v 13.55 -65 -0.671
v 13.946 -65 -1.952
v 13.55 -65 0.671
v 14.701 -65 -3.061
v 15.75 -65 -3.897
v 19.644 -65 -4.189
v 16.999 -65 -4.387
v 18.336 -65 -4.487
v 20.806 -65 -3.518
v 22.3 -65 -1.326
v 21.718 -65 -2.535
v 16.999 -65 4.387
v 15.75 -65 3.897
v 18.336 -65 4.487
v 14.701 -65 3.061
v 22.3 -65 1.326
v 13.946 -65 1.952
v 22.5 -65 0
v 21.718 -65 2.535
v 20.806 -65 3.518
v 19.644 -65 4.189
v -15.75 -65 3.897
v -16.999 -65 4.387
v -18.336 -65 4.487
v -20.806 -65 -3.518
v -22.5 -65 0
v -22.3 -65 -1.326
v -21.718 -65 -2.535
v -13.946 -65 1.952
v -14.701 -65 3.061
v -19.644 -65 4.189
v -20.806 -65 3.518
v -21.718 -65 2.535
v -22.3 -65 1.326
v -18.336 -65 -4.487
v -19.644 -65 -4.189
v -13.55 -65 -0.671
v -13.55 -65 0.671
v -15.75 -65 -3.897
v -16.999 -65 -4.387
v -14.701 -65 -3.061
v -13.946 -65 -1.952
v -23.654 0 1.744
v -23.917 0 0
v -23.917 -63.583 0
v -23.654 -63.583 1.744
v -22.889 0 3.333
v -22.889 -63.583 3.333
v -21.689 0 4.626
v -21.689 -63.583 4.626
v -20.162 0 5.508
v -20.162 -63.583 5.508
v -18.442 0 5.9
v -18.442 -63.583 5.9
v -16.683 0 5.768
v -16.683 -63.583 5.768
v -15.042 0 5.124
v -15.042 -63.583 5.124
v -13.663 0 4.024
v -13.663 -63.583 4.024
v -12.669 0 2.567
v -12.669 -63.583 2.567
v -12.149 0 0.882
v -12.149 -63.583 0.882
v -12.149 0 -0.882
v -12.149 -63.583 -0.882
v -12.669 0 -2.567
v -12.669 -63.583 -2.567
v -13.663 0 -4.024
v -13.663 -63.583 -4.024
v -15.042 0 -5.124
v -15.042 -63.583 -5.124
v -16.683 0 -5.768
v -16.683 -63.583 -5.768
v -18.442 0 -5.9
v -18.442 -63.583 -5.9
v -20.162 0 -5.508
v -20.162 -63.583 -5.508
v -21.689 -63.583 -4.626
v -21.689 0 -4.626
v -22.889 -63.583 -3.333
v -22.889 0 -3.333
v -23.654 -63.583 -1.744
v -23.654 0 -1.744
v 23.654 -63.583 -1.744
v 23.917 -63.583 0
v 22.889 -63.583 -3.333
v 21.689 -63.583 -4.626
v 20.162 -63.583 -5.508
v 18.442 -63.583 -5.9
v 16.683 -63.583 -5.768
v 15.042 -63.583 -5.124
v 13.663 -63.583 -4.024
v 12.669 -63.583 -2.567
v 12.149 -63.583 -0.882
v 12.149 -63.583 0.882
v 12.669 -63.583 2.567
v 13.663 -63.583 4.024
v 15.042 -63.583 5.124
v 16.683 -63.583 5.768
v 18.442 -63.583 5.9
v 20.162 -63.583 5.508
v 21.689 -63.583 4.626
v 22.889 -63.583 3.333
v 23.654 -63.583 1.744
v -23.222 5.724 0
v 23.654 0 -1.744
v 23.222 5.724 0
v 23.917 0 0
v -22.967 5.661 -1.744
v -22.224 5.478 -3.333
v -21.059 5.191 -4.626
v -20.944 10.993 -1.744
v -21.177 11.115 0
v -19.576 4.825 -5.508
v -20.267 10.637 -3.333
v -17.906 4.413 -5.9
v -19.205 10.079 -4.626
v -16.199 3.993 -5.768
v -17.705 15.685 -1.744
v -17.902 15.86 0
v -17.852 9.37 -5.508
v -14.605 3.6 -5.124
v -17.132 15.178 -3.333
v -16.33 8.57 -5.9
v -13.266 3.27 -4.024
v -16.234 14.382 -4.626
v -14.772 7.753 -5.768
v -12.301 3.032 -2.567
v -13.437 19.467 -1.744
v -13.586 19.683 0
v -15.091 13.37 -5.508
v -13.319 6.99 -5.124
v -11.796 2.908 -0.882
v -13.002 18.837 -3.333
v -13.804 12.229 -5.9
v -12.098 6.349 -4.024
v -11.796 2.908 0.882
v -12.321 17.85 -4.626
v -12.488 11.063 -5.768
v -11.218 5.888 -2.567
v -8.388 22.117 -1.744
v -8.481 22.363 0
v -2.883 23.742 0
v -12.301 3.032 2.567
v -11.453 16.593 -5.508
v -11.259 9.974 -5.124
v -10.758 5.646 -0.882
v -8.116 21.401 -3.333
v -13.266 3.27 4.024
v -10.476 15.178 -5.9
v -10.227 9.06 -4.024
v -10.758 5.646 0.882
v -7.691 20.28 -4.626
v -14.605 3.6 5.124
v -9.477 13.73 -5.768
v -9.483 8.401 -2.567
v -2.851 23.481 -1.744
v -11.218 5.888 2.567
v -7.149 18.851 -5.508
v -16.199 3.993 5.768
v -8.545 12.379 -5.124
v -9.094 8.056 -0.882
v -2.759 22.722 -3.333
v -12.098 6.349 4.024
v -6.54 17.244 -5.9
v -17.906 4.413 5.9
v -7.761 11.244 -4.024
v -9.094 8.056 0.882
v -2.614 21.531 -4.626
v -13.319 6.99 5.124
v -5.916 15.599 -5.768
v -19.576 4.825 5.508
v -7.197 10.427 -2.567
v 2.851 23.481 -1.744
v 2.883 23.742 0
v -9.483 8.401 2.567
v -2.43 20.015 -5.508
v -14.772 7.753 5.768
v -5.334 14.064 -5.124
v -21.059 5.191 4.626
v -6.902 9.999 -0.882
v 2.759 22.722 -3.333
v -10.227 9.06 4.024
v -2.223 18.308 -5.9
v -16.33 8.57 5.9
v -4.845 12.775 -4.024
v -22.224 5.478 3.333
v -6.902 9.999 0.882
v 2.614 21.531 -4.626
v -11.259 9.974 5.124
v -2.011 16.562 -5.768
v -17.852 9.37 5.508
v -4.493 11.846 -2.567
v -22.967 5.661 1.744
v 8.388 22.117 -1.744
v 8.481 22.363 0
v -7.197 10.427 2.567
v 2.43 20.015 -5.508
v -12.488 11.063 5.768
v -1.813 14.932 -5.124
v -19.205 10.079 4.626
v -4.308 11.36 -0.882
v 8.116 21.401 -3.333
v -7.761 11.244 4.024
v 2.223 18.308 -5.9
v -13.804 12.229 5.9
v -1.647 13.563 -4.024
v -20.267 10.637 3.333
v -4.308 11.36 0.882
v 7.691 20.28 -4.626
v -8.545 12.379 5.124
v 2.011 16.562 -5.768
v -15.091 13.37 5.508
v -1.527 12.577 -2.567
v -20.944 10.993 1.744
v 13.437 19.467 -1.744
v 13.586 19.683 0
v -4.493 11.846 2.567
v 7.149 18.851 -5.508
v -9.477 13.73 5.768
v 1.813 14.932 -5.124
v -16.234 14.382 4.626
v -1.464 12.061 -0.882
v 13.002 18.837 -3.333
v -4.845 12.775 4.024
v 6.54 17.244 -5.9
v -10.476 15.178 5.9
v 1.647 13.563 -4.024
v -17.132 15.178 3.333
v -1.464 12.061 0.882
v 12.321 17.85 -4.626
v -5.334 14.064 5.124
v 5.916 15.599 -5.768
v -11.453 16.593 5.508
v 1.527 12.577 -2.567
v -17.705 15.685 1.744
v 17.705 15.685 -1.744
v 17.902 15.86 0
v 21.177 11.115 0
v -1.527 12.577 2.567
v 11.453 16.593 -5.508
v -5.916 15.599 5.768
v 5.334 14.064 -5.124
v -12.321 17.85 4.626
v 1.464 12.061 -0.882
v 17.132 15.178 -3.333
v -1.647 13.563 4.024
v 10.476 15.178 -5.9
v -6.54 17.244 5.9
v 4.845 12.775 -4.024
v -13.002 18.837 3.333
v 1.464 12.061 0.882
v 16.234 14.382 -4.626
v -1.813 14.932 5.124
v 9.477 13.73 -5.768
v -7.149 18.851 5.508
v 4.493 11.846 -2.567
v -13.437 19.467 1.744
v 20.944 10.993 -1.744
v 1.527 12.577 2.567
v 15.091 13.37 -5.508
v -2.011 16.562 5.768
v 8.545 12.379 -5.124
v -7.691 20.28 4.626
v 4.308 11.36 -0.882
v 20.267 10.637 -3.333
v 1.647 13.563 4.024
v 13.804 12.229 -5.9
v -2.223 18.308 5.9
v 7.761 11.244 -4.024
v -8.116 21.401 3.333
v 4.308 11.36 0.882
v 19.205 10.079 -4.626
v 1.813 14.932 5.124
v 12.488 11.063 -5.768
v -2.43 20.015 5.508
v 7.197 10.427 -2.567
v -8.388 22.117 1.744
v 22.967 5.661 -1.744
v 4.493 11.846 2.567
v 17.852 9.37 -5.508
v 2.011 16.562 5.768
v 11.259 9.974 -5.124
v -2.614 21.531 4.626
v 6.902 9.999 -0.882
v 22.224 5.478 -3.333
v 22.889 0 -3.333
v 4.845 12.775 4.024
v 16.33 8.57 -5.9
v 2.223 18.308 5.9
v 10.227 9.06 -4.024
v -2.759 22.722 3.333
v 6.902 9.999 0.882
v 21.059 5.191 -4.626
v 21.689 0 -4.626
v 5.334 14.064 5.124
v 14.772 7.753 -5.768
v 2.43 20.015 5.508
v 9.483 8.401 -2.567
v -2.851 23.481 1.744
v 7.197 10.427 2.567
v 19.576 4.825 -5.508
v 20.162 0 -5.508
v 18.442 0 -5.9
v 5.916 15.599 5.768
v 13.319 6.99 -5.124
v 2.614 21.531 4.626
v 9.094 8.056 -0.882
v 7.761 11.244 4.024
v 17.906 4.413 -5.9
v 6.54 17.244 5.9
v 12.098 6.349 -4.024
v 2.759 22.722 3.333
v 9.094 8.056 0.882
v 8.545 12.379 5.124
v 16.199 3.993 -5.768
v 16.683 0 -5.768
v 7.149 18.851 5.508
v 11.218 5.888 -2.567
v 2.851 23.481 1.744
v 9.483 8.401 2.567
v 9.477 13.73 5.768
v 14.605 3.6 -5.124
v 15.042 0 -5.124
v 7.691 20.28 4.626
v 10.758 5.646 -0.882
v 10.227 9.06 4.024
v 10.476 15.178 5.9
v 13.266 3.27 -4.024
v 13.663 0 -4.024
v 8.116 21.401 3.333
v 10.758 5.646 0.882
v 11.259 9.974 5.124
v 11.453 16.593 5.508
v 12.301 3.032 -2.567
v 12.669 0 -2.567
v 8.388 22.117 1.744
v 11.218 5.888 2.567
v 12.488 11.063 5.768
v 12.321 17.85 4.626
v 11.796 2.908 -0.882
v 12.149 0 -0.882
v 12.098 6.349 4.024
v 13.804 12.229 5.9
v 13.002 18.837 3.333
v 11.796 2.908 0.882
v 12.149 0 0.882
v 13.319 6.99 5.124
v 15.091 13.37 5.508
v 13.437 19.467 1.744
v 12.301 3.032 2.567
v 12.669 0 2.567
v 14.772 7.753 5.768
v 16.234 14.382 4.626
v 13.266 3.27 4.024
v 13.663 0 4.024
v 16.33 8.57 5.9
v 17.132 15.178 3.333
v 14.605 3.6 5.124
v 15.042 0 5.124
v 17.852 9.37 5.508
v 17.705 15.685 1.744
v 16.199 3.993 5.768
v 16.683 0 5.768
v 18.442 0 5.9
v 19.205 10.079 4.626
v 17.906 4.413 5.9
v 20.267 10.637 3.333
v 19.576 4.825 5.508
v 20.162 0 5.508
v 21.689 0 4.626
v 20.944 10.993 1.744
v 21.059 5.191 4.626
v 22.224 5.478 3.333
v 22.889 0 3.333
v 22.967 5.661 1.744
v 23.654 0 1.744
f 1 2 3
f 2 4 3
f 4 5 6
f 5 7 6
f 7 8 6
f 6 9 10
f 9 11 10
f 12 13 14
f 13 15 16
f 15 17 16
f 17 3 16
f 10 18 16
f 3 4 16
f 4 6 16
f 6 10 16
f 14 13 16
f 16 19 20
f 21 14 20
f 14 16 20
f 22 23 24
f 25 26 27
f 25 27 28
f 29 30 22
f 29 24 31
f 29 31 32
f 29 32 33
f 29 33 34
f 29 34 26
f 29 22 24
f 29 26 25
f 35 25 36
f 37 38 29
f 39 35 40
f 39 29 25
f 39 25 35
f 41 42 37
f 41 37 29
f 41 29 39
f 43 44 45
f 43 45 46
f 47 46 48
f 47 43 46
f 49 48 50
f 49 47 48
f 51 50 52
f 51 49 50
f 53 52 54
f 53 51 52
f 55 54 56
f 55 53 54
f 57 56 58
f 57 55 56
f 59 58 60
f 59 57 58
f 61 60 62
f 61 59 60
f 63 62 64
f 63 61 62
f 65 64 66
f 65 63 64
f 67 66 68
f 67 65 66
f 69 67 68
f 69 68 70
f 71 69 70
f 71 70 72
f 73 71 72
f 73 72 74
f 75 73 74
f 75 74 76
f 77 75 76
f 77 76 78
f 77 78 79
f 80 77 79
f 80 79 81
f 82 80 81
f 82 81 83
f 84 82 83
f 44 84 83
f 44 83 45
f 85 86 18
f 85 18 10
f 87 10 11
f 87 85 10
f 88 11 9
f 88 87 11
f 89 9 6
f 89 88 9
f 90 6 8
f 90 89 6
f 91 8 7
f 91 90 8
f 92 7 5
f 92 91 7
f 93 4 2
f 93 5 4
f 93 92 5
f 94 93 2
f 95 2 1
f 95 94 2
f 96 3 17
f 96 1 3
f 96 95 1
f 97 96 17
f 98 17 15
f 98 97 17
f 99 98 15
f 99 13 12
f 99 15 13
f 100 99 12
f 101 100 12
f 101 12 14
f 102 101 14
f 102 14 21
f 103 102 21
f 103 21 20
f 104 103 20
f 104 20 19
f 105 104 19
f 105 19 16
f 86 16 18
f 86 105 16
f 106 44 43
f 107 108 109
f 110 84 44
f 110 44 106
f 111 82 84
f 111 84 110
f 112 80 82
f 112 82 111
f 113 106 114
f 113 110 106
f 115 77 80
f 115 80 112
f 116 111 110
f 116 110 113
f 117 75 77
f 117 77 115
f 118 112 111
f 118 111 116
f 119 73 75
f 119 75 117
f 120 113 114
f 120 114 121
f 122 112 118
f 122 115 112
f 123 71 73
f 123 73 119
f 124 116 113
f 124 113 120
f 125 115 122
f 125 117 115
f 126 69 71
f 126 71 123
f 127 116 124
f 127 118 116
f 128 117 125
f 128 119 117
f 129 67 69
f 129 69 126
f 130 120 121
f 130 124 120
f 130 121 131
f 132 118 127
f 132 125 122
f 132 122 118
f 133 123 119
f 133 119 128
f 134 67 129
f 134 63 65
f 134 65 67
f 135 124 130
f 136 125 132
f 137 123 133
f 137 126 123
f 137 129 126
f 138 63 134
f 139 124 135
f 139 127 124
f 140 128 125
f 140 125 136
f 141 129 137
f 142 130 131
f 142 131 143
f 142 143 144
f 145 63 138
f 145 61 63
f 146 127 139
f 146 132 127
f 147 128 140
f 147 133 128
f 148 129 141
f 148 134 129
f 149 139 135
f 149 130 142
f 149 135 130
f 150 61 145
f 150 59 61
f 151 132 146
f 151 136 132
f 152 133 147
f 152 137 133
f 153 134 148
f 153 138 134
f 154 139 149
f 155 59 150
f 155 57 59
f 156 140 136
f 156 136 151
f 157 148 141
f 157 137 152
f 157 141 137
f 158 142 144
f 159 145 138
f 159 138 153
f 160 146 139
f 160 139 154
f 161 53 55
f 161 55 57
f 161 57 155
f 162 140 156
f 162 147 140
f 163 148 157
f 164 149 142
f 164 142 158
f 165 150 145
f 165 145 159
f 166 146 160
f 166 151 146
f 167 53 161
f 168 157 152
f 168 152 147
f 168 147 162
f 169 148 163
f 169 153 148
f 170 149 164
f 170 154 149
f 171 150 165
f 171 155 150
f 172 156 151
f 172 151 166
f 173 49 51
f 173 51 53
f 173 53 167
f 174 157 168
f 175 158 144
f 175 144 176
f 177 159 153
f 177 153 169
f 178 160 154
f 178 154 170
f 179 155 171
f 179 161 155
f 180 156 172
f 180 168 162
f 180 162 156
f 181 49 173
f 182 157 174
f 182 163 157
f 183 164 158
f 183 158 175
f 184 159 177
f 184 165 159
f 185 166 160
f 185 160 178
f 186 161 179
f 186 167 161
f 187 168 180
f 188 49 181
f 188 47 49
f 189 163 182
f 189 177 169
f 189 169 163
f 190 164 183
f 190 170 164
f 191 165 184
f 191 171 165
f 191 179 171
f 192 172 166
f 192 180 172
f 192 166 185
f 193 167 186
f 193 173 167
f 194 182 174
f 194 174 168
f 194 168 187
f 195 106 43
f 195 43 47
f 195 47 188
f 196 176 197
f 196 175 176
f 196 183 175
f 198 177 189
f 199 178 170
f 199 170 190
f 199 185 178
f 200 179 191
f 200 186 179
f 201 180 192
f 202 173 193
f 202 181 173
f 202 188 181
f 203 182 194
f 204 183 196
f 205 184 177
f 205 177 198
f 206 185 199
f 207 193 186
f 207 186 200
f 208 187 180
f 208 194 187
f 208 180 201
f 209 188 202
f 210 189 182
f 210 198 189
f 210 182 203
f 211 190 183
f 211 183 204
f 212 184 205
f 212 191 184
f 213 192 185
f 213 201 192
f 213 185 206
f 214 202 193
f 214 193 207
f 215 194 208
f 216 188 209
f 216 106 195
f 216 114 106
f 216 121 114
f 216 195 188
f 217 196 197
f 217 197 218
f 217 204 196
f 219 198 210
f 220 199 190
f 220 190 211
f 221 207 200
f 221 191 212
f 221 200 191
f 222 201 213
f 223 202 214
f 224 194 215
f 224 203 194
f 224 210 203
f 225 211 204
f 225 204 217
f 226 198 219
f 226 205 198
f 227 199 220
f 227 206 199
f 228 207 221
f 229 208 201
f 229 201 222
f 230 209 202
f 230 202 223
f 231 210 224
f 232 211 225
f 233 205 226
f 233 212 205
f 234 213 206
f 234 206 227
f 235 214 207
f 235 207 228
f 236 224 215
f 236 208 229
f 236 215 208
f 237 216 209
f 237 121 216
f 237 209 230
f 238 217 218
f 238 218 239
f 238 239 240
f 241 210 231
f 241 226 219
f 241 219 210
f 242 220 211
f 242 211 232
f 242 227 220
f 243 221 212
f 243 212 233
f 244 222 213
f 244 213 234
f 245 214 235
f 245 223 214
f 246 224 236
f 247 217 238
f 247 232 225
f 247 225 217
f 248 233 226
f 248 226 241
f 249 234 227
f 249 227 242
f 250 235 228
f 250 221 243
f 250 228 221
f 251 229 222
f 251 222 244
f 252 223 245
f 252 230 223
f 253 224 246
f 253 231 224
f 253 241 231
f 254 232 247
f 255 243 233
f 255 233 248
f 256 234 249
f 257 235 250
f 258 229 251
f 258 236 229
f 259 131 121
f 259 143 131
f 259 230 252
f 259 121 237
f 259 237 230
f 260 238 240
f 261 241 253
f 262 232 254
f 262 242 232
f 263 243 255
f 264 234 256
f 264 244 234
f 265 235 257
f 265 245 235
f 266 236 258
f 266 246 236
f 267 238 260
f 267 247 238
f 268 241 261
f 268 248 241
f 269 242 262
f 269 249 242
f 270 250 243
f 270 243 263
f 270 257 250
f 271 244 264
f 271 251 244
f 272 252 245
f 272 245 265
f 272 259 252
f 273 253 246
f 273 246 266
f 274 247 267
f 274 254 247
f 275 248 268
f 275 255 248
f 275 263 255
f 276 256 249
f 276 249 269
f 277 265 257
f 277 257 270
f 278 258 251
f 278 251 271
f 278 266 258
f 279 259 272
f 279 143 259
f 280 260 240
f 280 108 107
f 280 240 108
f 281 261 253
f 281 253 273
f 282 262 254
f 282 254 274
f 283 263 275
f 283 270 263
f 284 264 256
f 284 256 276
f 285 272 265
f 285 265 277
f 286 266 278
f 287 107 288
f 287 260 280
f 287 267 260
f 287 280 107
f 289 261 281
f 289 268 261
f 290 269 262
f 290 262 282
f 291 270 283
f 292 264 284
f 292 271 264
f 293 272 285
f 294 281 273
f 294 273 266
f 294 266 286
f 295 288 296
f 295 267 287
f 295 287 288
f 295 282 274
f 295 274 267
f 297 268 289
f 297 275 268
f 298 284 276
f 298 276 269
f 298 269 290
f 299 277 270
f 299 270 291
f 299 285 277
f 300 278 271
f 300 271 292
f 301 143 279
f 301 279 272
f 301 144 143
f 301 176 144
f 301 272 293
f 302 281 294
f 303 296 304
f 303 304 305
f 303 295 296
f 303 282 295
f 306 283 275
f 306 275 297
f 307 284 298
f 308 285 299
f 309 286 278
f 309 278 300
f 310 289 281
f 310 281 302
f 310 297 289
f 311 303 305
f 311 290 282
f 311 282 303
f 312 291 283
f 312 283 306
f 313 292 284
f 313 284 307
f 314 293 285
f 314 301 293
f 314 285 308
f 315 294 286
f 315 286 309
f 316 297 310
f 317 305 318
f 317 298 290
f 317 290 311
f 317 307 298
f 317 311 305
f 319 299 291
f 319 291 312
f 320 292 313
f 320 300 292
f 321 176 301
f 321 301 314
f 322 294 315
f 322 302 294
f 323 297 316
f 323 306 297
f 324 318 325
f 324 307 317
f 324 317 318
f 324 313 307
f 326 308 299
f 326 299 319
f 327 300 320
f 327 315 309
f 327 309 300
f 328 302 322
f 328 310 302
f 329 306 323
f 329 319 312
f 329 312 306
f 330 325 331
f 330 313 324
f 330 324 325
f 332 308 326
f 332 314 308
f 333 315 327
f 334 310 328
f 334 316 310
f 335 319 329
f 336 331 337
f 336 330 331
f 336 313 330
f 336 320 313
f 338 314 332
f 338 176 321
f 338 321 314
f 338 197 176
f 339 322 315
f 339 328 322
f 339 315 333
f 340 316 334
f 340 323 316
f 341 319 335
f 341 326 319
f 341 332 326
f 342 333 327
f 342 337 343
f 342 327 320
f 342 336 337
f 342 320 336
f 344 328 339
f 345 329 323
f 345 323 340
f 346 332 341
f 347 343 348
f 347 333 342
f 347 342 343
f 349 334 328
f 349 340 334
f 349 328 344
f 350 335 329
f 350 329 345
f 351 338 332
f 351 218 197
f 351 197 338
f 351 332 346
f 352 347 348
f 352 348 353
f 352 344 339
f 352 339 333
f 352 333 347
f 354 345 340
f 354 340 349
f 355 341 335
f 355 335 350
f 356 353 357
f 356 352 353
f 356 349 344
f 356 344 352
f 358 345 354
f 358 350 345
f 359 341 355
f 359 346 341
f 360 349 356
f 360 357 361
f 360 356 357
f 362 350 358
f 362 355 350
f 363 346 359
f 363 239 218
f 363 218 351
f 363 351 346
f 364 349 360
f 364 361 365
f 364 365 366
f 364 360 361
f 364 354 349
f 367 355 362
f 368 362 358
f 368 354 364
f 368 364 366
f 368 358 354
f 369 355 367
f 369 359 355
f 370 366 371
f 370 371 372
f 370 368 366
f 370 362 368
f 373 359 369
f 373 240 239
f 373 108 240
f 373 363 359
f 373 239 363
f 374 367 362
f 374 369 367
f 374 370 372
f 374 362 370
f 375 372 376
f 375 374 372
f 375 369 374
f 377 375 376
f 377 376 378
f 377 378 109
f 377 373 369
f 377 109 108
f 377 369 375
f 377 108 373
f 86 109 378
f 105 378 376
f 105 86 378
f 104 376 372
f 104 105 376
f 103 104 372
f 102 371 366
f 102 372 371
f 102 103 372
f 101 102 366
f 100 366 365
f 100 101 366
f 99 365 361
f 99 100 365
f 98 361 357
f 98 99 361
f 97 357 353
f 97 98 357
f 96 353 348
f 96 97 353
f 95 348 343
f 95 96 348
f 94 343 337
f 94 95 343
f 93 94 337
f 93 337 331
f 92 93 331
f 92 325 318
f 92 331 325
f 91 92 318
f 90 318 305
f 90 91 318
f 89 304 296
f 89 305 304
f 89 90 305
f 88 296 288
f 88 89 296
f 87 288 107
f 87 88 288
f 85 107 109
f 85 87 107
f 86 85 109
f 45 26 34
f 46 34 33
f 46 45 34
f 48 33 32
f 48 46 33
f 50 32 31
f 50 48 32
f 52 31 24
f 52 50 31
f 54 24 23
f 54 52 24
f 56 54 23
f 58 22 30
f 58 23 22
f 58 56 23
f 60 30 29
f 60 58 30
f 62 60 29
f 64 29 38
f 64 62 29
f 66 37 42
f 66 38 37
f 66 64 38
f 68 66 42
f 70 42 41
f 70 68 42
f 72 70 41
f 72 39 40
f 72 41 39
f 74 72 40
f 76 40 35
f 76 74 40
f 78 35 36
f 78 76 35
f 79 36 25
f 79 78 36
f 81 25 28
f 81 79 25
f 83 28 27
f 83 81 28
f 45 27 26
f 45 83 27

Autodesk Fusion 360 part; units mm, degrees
sketch "Sketch1" plane through (0, 0, 0) normal (0, 0, 1) x (1, 0, 0)
  circle A0 centre (0, 0) radius 18 construction
  line L0 (0, 0) -> (50, 0) construction
  line L1 (0, 0) -> (0, 50) construction
  line L2 (0, 0) -> (-50, 0) construction
  line L3 (0, 0) -> (0, -100) construction
  line L4 (-18, 0) -> (-18, -65)
  line L5 (18, 0) -> (18, -65)
  arc A1 (18, 0) -> (-18, 0) centre (0, 0) ccw
  dimension "d1" = 36
  dimension "d6" = 65
  dimension "d7" = 65
sketch "Sketch2" plane through (0, 0, 0) normal (0, 1, 0) x (1, 0, 0)
  circle A0 centre (18, 0) radius 6
  point P0 (18, 0)
  dimension "d8" = 12
sweep "Sweep1" add profiles "Sketch2" path "Sketch1" along L5 A1 L4 section 1
chamfer "Chamfer1" distance 1.5 angle 45 2 edges at (-12.406, -65, 2.1697) (12.406, -65, -2.1697)
thread "Thread1" "ISO Metric profile 12.0 M12x1.75 6g" major diameter 11.8335 minor diameter 9.8365 pitch 1.75 angle 60 resizes the face on face at (-23.9925, -42.3333, -0.2991)
thread "Thread2" "ISO Metric profile 12.0 M12x1.75 6g" major diameter 11.8335 minor diameter 9.8365 pitch 1.75 angle 60 resizes the face on face at (23.8873, -42.3888, -0.5891)
